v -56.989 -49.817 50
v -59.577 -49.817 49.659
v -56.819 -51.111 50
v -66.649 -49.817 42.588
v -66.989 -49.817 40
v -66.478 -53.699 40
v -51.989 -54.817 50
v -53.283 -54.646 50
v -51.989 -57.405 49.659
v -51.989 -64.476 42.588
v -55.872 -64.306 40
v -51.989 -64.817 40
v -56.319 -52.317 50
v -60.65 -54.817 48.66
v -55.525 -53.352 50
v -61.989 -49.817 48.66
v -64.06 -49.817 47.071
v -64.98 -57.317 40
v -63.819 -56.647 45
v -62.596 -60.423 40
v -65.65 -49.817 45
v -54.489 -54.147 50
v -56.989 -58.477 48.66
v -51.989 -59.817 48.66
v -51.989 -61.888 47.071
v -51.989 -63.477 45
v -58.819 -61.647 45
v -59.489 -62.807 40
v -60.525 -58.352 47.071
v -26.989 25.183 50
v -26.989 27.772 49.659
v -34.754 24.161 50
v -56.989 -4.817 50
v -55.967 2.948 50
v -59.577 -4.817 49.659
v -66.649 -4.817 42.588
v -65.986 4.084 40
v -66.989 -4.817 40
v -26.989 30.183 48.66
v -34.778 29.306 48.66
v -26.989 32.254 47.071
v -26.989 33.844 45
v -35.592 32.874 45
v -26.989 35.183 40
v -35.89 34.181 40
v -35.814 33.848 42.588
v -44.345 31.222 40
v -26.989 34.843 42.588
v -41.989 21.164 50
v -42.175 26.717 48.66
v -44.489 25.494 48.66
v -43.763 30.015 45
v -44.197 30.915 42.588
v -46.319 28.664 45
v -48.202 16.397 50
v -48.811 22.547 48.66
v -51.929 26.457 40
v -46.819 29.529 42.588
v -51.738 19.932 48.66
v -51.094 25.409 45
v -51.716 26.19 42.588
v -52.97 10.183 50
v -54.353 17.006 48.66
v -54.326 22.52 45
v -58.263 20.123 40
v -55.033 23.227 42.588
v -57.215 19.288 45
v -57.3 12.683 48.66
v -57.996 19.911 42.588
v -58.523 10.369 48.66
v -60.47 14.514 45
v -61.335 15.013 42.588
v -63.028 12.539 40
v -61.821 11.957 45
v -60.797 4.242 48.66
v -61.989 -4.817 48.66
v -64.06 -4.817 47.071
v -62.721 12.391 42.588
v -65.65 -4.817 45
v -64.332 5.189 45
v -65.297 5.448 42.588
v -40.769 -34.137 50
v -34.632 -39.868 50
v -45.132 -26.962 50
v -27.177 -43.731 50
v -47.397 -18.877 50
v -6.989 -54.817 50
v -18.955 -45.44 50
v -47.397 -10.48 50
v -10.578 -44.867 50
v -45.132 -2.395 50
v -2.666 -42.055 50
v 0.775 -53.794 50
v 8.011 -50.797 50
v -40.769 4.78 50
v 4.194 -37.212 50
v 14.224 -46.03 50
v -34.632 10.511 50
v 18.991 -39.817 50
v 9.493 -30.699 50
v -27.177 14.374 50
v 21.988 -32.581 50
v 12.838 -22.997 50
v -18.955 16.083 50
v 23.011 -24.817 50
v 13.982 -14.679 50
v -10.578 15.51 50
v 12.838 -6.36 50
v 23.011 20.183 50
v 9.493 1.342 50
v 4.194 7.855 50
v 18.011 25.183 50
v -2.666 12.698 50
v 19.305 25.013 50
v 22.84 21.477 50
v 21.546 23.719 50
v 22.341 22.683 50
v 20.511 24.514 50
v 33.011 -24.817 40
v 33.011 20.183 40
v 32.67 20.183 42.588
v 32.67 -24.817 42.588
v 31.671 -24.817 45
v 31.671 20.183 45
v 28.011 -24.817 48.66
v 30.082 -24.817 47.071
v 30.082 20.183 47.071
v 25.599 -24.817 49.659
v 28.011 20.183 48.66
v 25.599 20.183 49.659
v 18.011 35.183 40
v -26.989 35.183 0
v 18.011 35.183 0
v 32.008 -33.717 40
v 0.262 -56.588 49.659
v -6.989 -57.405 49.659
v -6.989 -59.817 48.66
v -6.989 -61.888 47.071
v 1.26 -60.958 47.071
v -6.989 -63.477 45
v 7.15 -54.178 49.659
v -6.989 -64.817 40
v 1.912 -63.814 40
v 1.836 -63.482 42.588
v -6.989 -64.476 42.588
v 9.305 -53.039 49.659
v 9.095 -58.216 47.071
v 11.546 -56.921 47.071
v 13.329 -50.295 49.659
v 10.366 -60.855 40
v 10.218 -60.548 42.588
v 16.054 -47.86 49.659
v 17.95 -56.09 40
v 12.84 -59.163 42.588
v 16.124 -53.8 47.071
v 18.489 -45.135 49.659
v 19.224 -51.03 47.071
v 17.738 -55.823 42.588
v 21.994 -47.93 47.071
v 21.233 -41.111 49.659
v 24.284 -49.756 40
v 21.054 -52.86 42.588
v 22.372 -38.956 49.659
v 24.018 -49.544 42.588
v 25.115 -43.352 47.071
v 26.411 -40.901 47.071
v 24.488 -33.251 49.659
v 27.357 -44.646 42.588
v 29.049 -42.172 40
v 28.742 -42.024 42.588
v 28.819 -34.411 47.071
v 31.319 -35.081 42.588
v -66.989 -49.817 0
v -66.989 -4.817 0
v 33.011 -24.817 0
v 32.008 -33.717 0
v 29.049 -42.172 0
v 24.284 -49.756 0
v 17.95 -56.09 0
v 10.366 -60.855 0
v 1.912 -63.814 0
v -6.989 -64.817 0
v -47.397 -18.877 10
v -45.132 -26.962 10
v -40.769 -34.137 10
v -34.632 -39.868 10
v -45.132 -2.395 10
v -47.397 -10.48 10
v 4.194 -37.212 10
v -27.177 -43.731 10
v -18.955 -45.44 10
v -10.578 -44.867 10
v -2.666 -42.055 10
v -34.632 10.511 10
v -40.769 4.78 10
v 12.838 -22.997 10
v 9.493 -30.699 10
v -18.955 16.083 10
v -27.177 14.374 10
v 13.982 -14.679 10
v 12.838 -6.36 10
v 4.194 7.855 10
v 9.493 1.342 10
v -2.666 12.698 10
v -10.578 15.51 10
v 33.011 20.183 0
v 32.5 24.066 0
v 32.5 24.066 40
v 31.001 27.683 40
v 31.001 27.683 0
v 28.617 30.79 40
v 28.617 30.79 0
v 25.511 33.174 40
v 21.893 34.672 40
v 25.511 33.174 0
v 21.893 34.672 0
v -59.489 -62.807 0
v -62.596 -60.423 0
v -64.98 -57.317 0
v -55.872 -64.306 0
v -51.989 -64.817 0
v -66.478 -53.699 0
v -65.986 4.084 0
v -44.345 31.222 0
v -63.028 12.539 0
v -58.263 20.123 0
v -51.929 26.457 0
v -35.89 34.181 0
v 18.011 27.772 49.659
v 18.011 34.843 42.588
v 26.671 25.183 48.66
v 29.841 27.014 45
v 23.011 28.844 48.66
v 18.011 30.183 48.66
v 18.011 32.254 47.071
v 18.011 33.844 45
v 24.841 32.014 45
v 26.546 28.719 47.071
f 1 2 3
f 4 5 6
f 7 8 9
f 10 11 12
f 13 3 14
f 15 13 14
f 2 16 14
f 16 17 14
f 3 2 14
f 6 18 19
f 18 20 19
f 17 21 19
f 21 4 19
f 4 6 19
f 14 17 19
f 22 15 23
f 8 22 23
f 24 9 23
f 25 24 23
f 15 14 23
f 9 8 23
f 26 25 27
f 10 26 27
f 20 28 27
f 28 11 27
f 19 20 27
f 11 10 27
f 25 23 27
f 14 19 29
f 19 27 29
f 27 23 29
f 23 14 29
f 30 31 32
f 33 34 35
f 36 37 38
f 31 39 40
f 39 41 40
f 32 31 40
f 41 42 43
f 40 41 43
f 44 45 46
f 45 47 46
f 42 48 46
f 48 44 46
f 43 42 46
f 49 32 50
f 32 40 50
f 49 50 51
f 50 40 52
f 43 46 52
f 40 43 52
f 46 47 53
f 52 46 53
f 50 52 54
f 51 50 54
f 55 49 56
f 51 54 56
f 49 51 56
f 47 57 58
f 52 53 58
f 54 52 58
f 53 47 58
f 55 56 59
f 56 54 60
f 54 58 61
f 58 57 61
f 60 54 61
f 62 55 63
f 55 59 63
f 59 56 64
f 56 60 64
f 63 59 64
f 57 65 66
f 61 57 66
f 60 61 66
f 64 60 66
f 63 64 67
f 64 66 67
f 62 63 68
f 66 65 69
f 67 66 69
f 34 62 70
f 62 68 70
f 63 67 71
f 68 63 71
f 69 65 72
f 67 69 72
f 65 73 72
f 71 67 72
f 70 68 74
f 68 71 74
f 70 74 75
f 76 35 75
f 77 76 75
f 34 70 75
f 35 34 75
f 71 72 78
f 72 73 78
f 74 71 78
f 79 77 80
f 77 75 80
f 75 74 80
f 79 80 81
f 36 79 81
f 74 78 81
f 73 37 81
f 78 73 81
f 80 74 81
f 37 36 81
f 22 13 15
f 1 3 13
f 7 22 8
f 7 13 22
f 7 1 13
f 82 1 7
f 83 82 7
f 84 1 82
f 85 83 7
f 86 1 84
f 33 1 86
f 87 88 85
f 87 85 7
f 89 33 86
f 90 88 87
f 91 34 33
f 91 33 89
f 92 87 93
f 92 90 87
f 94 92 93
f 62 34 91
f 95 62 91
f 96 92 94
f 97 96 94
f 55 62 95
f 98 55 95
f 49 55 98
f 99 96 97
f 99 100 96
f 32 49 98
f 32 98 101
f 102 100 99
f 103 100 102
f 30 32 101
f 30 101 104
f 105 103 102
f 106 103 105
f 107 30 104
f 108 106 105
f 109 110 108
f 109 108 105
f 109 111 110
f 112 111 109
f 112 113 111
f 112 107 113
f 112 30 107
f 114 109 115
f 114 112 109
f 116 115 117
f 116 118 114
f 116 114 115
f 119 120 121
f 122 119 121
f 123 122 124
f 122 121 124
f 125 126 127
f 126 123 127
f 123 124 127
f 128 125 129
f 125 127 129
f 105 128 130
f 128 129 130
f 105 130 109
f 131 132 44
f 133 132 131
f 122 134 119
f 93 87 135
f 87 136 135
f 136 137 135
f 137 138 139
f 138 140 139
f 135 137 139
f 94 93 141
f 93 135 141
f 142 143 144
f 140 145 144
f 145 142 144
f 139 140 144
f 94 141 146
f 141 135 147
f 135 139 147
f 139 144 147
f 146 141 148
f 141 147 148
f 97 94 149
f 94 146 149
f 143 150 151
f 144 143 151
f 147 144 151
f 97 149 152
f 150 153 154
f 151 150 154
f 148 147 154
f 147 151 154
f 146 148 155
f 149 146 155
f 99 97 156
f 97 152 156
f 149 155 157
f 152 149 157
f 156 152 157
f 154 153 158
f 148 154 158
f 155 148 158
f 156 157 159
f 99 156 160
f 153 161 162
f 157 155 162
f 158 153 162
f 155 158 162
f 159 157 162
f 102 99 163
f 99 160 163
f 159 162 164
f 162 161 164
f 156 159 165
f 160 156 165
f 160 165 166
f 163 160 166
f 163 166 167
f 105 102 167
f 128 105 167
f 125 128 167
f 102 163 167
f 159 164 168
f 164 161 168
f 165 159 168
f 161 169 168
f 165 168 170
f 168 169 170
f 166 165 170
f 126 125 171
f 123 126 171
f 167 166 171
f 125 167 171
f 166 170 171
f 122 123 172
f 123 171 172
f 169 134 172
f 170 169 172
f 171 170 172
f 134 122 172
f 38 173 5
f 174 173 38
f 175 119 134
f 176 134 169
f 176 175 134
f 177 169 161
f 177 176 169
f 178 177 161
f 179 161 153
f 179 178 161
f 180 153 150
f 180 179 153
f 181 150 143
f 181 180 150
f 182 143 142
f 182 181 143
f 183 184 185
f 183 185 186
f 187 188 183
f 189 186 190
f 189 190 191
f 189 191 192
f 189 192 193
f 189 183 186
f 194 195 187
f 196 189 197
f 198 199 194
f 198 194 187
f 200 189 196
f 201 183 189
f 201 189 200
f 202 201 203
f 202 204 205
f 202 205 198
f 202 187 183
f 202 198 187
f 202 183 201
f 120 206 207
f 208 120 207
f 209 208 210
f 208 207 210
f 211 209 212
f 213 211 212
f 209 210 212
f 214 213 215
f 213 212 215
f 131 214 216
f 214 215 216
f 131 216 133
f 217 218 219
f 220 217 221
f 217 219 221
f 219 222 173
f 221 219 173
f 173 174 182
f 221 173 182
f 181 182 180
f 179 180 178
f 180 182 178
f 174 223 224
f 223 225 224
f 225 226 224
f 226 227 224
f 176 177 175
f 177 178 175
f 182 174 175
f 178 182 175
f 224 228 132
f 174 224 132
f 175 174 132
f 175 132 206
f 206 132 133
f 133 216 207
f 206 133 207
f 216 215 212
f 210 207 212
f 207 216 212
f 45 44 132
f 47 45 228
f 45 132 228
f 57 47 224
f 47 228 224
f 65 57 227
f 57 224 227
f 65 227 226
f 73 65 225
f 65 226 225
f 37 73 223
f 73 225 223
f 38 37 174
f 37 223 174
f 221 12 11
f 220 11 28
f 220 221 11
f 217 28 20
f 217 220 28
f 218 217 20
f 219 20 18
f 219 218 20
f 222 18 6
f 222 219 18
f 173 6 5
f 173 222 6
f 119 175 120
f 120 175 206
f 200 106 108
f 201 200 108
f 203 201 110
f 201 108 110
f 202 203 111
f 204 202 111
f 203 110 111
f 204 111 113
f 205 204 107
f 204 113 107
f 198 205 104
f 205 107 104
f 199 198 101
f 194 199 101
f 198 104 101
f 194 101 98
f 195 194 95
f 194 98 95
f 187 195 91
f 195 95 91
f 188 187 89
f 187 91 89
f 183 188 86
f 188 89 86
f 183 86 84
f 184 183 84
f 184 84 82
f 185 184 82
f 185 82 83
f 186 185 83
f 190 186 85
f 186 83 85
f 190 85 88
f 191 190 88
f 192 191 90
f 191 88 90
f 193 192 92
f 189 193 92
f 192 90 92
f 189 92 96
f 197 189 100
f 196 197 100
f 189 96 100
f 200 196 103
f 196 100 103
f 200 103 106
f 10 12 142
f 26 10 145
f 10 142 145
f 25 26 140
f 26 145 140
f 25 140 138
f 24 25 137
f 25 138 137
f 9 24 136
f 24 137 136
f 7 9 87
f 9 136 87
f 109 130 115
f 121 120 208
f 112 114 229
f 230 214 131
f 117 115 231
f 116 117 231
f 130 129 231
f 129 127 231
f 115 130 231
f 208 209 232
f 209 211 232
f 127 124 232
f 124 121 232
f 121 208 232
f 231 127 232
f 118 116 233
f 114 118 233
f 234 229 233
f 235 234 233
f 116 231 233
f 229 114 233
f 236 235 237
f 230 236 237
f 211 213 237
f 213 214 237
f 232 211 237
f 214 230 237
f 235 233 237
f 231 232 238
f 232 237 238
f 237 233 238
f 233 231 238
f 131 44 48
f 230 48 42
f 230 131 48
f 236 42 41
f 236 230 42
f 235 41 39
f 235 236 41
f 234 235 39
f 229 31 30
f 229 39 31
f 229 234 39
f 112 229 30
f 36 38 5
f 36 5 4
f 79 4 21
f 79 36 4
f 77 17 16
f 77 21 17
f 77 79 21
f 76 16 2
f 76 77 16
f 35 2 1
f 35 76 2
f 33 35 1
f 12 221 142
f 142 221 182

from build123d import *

# Parameters (mm, degrees)
F0_W        = 100
F0_H        = 100
F1_DEPTH    = 50
F2_R        = 10
F3_T1_DEPTH = 150
F3_T4_ANGLE = 90
F3_T6_ANGLE = 90
F4_T1_DEPTH = 87.5
F4_T4_ANGLE = 90
F4_T6_ANGLE = 90
F5_R        = 30.8330010445
F6_DEPTH    = 40


# Not quite as in the source:
# - a fillet or chamfer that OpenCascade refuses, or shapes differently, is made with other operations: its cross-section is extruded or revolved along the edge and cut away or added


with BuildPart() as f1:
    # F0 (on Top) → F1 (new body)
    with BuildSketch(Plane.XY):
        with Locations((-16.9892802835, -14.8166164756)):
            Rectangle(F0_W, F0_H)
    extrude(amount=F1_DEPTH)

    # F2
    f2_edges = [f1.edges().sort_by_distance(p)[0] for p in [
        (-16.98928, -64.816616, 50),
        (33.01072, -14.816616, 50),
        (-16.98928, 35.183384, 50),
        (-66.98928, -14.816616, 50),
    ]]
    fillet(f2_edges, radius=F2_R)

    # F3: fillet of radius 40 on 2 edges, made by hand

    # F3_s2 → F3_t1 (cut)
    with BuildSketch(Plane.XY.offset(-100)):
        with BuildLine():
            ThreePointArc((33.0107197165, -24.8166164756), (21.294990964, -53.100887723), (-6.9892802835, -64.8166164756))
            Line((-6.9892802835, -64.8166164756), (33.0107197165, -64.8166164756))
            Line((33.0107197165, -64.8166164756), (33.0107197165, -24.8166164756))
        make_face()
        with BuildLine():
            ThreePointArc((-26.9892802835, 35.1833835244), (-55.2735515309, 23.4676547719), (-66.9892802835, -4.8166164756))
            Line((-66.9892802835, -4.8166164756), (-66.9892802835, 35.1833835244))
            Line((-66.9892802835, 35.1833835244), (-26.9892802835, 35.1833835244))
        make_face()
    extrude(amount=F3_T1_DEPTH, mode=Mode.SUBTRACT)

    # F3_s3 → F3_t4 (revolve, cut)
    with BuildSketch(Plane.YZ.offset(-26.9892802835)):
        with BuildLine():
            ThreePointArc((25.1833835244, 50), (32.2544513363, 47.0710678119), (35.1833835244, 40))
            Line((35.1833835244, 40), (35.1833835244, 50))
            Line((35.1833835244, 50), (25.1833835244, 50))
        make_face()
    revolve(axis=Axis((-26.9892802835, -4.8166164756, 50), (0, 0, 1)), revolution_arc=F3_T4_ANGLE, mode=Mode.SUBTRACT)

    # F3_s5 → F3_t6 (revolve, cut)
    with BuildSketch(Plane.YZ.offset(-6.9892802835)):
        with BuildLine():
            ThreePointArc((-54.8166164756, 50), (-61.8876842874, 47.0710678119), (-64.8166164756, 40))
            Line((-64.8166164756, 40), (-64.8166164756, 50))
            Line((-64.8166164756, 50), (-54.8166164756, 50))
        make_face()
    revolve(axis=Axis((-6.9892802835, -24.8166164756, 50), (0, 0, 1)), revolution_arc=F3_T6_ANGLE, mode=Mode.SUBTRACT)

    # F4: fillet of radius 15 on 2 edges, made by hand

    # F4_s2 → F4_t1 (cut)
    with BuildSketch(Plane.XY.offset(-37.5)):
        with BuildLine():
            ThreePointArc((33.0107197165, 20.1833835244), (28.6173214343, 30.7899852422), (18.0107197165, 35.1833835244))
            Line((18.0107197165, 35.1833835244), (33.0107197165, 35.1833835244))
            Line((33.0107197165, 35.1833835244), (33.0107197165, 20.1833835244))
        make_face()
        with BuildLine():
            ThreePointArc((-51.9892802835, -64.8166164756), (-62.5958820012, -60.4232181934), (-66.9892802835, -49.8166164756))
            Line((-66.9892802835, -49.8166164756), (-66.9892802835, -64.8166164756))
            Line((-66.9892802835, -64.8166164756), (-51.9892802835, -64.8166164756))
        make_face()
    extrude(amount=F4_T1_DEPTH, mode=Mode.SUBTRACT)

    # F4_s3 → F4_t4 (revolve, cut)
    with BuildSketch(Plane.XZ.offset(49.8166164756)):
        with BuildLine():
            ThreePointArc((-56.9892802835, 50), (-64.0603480953, 47.0710678119), (-66.9892802835, 40))
            Line((-66.9892802835, 40), (-66.9892802835, 50))
            Line((-66.9892802835, 50), (-56.9892802835, 50))
        make_face()
    revolve(axis=Axis((-51.9892802835, -49.8166164756, 50), (0, 0, 1)), revolution_arc=F4_T4_ANGLE, mode=Mode.SUBTRACT)

    # F4_s5 → F4_t6 (revolve, cut)
    with BuildSketch(Plane.XZ.offset(-20.1833835244)):
        with BuildLine():
            ThreePointArc((23.0107197165, 50), (30.0817875284, 47.0710678119), (33.0107197165, 40))
            Line((33.0107197165, 40), (33.0107197165, 50))
            Line((33.0107197165, 50), (23.0107197165, 50))
        make_face()
    revolve(axis=Axis((18.0107197165, 20.1833835244, 50), (0, 0, 1)), revolution_arc=F4_T6_ANGLE, mode=Mode.SUBTRACT)

    # F5 (on face) → F6 (cut)
    with BuildSketch(Plane.XY.offset(50)):
        with Locations((-16.8512575328, -14.6785899997)):
            Circle(F5_R)
    extrude(amount=-F6_DEPTH, mode=Mode.SUBTRACT)


solid = f1.part
